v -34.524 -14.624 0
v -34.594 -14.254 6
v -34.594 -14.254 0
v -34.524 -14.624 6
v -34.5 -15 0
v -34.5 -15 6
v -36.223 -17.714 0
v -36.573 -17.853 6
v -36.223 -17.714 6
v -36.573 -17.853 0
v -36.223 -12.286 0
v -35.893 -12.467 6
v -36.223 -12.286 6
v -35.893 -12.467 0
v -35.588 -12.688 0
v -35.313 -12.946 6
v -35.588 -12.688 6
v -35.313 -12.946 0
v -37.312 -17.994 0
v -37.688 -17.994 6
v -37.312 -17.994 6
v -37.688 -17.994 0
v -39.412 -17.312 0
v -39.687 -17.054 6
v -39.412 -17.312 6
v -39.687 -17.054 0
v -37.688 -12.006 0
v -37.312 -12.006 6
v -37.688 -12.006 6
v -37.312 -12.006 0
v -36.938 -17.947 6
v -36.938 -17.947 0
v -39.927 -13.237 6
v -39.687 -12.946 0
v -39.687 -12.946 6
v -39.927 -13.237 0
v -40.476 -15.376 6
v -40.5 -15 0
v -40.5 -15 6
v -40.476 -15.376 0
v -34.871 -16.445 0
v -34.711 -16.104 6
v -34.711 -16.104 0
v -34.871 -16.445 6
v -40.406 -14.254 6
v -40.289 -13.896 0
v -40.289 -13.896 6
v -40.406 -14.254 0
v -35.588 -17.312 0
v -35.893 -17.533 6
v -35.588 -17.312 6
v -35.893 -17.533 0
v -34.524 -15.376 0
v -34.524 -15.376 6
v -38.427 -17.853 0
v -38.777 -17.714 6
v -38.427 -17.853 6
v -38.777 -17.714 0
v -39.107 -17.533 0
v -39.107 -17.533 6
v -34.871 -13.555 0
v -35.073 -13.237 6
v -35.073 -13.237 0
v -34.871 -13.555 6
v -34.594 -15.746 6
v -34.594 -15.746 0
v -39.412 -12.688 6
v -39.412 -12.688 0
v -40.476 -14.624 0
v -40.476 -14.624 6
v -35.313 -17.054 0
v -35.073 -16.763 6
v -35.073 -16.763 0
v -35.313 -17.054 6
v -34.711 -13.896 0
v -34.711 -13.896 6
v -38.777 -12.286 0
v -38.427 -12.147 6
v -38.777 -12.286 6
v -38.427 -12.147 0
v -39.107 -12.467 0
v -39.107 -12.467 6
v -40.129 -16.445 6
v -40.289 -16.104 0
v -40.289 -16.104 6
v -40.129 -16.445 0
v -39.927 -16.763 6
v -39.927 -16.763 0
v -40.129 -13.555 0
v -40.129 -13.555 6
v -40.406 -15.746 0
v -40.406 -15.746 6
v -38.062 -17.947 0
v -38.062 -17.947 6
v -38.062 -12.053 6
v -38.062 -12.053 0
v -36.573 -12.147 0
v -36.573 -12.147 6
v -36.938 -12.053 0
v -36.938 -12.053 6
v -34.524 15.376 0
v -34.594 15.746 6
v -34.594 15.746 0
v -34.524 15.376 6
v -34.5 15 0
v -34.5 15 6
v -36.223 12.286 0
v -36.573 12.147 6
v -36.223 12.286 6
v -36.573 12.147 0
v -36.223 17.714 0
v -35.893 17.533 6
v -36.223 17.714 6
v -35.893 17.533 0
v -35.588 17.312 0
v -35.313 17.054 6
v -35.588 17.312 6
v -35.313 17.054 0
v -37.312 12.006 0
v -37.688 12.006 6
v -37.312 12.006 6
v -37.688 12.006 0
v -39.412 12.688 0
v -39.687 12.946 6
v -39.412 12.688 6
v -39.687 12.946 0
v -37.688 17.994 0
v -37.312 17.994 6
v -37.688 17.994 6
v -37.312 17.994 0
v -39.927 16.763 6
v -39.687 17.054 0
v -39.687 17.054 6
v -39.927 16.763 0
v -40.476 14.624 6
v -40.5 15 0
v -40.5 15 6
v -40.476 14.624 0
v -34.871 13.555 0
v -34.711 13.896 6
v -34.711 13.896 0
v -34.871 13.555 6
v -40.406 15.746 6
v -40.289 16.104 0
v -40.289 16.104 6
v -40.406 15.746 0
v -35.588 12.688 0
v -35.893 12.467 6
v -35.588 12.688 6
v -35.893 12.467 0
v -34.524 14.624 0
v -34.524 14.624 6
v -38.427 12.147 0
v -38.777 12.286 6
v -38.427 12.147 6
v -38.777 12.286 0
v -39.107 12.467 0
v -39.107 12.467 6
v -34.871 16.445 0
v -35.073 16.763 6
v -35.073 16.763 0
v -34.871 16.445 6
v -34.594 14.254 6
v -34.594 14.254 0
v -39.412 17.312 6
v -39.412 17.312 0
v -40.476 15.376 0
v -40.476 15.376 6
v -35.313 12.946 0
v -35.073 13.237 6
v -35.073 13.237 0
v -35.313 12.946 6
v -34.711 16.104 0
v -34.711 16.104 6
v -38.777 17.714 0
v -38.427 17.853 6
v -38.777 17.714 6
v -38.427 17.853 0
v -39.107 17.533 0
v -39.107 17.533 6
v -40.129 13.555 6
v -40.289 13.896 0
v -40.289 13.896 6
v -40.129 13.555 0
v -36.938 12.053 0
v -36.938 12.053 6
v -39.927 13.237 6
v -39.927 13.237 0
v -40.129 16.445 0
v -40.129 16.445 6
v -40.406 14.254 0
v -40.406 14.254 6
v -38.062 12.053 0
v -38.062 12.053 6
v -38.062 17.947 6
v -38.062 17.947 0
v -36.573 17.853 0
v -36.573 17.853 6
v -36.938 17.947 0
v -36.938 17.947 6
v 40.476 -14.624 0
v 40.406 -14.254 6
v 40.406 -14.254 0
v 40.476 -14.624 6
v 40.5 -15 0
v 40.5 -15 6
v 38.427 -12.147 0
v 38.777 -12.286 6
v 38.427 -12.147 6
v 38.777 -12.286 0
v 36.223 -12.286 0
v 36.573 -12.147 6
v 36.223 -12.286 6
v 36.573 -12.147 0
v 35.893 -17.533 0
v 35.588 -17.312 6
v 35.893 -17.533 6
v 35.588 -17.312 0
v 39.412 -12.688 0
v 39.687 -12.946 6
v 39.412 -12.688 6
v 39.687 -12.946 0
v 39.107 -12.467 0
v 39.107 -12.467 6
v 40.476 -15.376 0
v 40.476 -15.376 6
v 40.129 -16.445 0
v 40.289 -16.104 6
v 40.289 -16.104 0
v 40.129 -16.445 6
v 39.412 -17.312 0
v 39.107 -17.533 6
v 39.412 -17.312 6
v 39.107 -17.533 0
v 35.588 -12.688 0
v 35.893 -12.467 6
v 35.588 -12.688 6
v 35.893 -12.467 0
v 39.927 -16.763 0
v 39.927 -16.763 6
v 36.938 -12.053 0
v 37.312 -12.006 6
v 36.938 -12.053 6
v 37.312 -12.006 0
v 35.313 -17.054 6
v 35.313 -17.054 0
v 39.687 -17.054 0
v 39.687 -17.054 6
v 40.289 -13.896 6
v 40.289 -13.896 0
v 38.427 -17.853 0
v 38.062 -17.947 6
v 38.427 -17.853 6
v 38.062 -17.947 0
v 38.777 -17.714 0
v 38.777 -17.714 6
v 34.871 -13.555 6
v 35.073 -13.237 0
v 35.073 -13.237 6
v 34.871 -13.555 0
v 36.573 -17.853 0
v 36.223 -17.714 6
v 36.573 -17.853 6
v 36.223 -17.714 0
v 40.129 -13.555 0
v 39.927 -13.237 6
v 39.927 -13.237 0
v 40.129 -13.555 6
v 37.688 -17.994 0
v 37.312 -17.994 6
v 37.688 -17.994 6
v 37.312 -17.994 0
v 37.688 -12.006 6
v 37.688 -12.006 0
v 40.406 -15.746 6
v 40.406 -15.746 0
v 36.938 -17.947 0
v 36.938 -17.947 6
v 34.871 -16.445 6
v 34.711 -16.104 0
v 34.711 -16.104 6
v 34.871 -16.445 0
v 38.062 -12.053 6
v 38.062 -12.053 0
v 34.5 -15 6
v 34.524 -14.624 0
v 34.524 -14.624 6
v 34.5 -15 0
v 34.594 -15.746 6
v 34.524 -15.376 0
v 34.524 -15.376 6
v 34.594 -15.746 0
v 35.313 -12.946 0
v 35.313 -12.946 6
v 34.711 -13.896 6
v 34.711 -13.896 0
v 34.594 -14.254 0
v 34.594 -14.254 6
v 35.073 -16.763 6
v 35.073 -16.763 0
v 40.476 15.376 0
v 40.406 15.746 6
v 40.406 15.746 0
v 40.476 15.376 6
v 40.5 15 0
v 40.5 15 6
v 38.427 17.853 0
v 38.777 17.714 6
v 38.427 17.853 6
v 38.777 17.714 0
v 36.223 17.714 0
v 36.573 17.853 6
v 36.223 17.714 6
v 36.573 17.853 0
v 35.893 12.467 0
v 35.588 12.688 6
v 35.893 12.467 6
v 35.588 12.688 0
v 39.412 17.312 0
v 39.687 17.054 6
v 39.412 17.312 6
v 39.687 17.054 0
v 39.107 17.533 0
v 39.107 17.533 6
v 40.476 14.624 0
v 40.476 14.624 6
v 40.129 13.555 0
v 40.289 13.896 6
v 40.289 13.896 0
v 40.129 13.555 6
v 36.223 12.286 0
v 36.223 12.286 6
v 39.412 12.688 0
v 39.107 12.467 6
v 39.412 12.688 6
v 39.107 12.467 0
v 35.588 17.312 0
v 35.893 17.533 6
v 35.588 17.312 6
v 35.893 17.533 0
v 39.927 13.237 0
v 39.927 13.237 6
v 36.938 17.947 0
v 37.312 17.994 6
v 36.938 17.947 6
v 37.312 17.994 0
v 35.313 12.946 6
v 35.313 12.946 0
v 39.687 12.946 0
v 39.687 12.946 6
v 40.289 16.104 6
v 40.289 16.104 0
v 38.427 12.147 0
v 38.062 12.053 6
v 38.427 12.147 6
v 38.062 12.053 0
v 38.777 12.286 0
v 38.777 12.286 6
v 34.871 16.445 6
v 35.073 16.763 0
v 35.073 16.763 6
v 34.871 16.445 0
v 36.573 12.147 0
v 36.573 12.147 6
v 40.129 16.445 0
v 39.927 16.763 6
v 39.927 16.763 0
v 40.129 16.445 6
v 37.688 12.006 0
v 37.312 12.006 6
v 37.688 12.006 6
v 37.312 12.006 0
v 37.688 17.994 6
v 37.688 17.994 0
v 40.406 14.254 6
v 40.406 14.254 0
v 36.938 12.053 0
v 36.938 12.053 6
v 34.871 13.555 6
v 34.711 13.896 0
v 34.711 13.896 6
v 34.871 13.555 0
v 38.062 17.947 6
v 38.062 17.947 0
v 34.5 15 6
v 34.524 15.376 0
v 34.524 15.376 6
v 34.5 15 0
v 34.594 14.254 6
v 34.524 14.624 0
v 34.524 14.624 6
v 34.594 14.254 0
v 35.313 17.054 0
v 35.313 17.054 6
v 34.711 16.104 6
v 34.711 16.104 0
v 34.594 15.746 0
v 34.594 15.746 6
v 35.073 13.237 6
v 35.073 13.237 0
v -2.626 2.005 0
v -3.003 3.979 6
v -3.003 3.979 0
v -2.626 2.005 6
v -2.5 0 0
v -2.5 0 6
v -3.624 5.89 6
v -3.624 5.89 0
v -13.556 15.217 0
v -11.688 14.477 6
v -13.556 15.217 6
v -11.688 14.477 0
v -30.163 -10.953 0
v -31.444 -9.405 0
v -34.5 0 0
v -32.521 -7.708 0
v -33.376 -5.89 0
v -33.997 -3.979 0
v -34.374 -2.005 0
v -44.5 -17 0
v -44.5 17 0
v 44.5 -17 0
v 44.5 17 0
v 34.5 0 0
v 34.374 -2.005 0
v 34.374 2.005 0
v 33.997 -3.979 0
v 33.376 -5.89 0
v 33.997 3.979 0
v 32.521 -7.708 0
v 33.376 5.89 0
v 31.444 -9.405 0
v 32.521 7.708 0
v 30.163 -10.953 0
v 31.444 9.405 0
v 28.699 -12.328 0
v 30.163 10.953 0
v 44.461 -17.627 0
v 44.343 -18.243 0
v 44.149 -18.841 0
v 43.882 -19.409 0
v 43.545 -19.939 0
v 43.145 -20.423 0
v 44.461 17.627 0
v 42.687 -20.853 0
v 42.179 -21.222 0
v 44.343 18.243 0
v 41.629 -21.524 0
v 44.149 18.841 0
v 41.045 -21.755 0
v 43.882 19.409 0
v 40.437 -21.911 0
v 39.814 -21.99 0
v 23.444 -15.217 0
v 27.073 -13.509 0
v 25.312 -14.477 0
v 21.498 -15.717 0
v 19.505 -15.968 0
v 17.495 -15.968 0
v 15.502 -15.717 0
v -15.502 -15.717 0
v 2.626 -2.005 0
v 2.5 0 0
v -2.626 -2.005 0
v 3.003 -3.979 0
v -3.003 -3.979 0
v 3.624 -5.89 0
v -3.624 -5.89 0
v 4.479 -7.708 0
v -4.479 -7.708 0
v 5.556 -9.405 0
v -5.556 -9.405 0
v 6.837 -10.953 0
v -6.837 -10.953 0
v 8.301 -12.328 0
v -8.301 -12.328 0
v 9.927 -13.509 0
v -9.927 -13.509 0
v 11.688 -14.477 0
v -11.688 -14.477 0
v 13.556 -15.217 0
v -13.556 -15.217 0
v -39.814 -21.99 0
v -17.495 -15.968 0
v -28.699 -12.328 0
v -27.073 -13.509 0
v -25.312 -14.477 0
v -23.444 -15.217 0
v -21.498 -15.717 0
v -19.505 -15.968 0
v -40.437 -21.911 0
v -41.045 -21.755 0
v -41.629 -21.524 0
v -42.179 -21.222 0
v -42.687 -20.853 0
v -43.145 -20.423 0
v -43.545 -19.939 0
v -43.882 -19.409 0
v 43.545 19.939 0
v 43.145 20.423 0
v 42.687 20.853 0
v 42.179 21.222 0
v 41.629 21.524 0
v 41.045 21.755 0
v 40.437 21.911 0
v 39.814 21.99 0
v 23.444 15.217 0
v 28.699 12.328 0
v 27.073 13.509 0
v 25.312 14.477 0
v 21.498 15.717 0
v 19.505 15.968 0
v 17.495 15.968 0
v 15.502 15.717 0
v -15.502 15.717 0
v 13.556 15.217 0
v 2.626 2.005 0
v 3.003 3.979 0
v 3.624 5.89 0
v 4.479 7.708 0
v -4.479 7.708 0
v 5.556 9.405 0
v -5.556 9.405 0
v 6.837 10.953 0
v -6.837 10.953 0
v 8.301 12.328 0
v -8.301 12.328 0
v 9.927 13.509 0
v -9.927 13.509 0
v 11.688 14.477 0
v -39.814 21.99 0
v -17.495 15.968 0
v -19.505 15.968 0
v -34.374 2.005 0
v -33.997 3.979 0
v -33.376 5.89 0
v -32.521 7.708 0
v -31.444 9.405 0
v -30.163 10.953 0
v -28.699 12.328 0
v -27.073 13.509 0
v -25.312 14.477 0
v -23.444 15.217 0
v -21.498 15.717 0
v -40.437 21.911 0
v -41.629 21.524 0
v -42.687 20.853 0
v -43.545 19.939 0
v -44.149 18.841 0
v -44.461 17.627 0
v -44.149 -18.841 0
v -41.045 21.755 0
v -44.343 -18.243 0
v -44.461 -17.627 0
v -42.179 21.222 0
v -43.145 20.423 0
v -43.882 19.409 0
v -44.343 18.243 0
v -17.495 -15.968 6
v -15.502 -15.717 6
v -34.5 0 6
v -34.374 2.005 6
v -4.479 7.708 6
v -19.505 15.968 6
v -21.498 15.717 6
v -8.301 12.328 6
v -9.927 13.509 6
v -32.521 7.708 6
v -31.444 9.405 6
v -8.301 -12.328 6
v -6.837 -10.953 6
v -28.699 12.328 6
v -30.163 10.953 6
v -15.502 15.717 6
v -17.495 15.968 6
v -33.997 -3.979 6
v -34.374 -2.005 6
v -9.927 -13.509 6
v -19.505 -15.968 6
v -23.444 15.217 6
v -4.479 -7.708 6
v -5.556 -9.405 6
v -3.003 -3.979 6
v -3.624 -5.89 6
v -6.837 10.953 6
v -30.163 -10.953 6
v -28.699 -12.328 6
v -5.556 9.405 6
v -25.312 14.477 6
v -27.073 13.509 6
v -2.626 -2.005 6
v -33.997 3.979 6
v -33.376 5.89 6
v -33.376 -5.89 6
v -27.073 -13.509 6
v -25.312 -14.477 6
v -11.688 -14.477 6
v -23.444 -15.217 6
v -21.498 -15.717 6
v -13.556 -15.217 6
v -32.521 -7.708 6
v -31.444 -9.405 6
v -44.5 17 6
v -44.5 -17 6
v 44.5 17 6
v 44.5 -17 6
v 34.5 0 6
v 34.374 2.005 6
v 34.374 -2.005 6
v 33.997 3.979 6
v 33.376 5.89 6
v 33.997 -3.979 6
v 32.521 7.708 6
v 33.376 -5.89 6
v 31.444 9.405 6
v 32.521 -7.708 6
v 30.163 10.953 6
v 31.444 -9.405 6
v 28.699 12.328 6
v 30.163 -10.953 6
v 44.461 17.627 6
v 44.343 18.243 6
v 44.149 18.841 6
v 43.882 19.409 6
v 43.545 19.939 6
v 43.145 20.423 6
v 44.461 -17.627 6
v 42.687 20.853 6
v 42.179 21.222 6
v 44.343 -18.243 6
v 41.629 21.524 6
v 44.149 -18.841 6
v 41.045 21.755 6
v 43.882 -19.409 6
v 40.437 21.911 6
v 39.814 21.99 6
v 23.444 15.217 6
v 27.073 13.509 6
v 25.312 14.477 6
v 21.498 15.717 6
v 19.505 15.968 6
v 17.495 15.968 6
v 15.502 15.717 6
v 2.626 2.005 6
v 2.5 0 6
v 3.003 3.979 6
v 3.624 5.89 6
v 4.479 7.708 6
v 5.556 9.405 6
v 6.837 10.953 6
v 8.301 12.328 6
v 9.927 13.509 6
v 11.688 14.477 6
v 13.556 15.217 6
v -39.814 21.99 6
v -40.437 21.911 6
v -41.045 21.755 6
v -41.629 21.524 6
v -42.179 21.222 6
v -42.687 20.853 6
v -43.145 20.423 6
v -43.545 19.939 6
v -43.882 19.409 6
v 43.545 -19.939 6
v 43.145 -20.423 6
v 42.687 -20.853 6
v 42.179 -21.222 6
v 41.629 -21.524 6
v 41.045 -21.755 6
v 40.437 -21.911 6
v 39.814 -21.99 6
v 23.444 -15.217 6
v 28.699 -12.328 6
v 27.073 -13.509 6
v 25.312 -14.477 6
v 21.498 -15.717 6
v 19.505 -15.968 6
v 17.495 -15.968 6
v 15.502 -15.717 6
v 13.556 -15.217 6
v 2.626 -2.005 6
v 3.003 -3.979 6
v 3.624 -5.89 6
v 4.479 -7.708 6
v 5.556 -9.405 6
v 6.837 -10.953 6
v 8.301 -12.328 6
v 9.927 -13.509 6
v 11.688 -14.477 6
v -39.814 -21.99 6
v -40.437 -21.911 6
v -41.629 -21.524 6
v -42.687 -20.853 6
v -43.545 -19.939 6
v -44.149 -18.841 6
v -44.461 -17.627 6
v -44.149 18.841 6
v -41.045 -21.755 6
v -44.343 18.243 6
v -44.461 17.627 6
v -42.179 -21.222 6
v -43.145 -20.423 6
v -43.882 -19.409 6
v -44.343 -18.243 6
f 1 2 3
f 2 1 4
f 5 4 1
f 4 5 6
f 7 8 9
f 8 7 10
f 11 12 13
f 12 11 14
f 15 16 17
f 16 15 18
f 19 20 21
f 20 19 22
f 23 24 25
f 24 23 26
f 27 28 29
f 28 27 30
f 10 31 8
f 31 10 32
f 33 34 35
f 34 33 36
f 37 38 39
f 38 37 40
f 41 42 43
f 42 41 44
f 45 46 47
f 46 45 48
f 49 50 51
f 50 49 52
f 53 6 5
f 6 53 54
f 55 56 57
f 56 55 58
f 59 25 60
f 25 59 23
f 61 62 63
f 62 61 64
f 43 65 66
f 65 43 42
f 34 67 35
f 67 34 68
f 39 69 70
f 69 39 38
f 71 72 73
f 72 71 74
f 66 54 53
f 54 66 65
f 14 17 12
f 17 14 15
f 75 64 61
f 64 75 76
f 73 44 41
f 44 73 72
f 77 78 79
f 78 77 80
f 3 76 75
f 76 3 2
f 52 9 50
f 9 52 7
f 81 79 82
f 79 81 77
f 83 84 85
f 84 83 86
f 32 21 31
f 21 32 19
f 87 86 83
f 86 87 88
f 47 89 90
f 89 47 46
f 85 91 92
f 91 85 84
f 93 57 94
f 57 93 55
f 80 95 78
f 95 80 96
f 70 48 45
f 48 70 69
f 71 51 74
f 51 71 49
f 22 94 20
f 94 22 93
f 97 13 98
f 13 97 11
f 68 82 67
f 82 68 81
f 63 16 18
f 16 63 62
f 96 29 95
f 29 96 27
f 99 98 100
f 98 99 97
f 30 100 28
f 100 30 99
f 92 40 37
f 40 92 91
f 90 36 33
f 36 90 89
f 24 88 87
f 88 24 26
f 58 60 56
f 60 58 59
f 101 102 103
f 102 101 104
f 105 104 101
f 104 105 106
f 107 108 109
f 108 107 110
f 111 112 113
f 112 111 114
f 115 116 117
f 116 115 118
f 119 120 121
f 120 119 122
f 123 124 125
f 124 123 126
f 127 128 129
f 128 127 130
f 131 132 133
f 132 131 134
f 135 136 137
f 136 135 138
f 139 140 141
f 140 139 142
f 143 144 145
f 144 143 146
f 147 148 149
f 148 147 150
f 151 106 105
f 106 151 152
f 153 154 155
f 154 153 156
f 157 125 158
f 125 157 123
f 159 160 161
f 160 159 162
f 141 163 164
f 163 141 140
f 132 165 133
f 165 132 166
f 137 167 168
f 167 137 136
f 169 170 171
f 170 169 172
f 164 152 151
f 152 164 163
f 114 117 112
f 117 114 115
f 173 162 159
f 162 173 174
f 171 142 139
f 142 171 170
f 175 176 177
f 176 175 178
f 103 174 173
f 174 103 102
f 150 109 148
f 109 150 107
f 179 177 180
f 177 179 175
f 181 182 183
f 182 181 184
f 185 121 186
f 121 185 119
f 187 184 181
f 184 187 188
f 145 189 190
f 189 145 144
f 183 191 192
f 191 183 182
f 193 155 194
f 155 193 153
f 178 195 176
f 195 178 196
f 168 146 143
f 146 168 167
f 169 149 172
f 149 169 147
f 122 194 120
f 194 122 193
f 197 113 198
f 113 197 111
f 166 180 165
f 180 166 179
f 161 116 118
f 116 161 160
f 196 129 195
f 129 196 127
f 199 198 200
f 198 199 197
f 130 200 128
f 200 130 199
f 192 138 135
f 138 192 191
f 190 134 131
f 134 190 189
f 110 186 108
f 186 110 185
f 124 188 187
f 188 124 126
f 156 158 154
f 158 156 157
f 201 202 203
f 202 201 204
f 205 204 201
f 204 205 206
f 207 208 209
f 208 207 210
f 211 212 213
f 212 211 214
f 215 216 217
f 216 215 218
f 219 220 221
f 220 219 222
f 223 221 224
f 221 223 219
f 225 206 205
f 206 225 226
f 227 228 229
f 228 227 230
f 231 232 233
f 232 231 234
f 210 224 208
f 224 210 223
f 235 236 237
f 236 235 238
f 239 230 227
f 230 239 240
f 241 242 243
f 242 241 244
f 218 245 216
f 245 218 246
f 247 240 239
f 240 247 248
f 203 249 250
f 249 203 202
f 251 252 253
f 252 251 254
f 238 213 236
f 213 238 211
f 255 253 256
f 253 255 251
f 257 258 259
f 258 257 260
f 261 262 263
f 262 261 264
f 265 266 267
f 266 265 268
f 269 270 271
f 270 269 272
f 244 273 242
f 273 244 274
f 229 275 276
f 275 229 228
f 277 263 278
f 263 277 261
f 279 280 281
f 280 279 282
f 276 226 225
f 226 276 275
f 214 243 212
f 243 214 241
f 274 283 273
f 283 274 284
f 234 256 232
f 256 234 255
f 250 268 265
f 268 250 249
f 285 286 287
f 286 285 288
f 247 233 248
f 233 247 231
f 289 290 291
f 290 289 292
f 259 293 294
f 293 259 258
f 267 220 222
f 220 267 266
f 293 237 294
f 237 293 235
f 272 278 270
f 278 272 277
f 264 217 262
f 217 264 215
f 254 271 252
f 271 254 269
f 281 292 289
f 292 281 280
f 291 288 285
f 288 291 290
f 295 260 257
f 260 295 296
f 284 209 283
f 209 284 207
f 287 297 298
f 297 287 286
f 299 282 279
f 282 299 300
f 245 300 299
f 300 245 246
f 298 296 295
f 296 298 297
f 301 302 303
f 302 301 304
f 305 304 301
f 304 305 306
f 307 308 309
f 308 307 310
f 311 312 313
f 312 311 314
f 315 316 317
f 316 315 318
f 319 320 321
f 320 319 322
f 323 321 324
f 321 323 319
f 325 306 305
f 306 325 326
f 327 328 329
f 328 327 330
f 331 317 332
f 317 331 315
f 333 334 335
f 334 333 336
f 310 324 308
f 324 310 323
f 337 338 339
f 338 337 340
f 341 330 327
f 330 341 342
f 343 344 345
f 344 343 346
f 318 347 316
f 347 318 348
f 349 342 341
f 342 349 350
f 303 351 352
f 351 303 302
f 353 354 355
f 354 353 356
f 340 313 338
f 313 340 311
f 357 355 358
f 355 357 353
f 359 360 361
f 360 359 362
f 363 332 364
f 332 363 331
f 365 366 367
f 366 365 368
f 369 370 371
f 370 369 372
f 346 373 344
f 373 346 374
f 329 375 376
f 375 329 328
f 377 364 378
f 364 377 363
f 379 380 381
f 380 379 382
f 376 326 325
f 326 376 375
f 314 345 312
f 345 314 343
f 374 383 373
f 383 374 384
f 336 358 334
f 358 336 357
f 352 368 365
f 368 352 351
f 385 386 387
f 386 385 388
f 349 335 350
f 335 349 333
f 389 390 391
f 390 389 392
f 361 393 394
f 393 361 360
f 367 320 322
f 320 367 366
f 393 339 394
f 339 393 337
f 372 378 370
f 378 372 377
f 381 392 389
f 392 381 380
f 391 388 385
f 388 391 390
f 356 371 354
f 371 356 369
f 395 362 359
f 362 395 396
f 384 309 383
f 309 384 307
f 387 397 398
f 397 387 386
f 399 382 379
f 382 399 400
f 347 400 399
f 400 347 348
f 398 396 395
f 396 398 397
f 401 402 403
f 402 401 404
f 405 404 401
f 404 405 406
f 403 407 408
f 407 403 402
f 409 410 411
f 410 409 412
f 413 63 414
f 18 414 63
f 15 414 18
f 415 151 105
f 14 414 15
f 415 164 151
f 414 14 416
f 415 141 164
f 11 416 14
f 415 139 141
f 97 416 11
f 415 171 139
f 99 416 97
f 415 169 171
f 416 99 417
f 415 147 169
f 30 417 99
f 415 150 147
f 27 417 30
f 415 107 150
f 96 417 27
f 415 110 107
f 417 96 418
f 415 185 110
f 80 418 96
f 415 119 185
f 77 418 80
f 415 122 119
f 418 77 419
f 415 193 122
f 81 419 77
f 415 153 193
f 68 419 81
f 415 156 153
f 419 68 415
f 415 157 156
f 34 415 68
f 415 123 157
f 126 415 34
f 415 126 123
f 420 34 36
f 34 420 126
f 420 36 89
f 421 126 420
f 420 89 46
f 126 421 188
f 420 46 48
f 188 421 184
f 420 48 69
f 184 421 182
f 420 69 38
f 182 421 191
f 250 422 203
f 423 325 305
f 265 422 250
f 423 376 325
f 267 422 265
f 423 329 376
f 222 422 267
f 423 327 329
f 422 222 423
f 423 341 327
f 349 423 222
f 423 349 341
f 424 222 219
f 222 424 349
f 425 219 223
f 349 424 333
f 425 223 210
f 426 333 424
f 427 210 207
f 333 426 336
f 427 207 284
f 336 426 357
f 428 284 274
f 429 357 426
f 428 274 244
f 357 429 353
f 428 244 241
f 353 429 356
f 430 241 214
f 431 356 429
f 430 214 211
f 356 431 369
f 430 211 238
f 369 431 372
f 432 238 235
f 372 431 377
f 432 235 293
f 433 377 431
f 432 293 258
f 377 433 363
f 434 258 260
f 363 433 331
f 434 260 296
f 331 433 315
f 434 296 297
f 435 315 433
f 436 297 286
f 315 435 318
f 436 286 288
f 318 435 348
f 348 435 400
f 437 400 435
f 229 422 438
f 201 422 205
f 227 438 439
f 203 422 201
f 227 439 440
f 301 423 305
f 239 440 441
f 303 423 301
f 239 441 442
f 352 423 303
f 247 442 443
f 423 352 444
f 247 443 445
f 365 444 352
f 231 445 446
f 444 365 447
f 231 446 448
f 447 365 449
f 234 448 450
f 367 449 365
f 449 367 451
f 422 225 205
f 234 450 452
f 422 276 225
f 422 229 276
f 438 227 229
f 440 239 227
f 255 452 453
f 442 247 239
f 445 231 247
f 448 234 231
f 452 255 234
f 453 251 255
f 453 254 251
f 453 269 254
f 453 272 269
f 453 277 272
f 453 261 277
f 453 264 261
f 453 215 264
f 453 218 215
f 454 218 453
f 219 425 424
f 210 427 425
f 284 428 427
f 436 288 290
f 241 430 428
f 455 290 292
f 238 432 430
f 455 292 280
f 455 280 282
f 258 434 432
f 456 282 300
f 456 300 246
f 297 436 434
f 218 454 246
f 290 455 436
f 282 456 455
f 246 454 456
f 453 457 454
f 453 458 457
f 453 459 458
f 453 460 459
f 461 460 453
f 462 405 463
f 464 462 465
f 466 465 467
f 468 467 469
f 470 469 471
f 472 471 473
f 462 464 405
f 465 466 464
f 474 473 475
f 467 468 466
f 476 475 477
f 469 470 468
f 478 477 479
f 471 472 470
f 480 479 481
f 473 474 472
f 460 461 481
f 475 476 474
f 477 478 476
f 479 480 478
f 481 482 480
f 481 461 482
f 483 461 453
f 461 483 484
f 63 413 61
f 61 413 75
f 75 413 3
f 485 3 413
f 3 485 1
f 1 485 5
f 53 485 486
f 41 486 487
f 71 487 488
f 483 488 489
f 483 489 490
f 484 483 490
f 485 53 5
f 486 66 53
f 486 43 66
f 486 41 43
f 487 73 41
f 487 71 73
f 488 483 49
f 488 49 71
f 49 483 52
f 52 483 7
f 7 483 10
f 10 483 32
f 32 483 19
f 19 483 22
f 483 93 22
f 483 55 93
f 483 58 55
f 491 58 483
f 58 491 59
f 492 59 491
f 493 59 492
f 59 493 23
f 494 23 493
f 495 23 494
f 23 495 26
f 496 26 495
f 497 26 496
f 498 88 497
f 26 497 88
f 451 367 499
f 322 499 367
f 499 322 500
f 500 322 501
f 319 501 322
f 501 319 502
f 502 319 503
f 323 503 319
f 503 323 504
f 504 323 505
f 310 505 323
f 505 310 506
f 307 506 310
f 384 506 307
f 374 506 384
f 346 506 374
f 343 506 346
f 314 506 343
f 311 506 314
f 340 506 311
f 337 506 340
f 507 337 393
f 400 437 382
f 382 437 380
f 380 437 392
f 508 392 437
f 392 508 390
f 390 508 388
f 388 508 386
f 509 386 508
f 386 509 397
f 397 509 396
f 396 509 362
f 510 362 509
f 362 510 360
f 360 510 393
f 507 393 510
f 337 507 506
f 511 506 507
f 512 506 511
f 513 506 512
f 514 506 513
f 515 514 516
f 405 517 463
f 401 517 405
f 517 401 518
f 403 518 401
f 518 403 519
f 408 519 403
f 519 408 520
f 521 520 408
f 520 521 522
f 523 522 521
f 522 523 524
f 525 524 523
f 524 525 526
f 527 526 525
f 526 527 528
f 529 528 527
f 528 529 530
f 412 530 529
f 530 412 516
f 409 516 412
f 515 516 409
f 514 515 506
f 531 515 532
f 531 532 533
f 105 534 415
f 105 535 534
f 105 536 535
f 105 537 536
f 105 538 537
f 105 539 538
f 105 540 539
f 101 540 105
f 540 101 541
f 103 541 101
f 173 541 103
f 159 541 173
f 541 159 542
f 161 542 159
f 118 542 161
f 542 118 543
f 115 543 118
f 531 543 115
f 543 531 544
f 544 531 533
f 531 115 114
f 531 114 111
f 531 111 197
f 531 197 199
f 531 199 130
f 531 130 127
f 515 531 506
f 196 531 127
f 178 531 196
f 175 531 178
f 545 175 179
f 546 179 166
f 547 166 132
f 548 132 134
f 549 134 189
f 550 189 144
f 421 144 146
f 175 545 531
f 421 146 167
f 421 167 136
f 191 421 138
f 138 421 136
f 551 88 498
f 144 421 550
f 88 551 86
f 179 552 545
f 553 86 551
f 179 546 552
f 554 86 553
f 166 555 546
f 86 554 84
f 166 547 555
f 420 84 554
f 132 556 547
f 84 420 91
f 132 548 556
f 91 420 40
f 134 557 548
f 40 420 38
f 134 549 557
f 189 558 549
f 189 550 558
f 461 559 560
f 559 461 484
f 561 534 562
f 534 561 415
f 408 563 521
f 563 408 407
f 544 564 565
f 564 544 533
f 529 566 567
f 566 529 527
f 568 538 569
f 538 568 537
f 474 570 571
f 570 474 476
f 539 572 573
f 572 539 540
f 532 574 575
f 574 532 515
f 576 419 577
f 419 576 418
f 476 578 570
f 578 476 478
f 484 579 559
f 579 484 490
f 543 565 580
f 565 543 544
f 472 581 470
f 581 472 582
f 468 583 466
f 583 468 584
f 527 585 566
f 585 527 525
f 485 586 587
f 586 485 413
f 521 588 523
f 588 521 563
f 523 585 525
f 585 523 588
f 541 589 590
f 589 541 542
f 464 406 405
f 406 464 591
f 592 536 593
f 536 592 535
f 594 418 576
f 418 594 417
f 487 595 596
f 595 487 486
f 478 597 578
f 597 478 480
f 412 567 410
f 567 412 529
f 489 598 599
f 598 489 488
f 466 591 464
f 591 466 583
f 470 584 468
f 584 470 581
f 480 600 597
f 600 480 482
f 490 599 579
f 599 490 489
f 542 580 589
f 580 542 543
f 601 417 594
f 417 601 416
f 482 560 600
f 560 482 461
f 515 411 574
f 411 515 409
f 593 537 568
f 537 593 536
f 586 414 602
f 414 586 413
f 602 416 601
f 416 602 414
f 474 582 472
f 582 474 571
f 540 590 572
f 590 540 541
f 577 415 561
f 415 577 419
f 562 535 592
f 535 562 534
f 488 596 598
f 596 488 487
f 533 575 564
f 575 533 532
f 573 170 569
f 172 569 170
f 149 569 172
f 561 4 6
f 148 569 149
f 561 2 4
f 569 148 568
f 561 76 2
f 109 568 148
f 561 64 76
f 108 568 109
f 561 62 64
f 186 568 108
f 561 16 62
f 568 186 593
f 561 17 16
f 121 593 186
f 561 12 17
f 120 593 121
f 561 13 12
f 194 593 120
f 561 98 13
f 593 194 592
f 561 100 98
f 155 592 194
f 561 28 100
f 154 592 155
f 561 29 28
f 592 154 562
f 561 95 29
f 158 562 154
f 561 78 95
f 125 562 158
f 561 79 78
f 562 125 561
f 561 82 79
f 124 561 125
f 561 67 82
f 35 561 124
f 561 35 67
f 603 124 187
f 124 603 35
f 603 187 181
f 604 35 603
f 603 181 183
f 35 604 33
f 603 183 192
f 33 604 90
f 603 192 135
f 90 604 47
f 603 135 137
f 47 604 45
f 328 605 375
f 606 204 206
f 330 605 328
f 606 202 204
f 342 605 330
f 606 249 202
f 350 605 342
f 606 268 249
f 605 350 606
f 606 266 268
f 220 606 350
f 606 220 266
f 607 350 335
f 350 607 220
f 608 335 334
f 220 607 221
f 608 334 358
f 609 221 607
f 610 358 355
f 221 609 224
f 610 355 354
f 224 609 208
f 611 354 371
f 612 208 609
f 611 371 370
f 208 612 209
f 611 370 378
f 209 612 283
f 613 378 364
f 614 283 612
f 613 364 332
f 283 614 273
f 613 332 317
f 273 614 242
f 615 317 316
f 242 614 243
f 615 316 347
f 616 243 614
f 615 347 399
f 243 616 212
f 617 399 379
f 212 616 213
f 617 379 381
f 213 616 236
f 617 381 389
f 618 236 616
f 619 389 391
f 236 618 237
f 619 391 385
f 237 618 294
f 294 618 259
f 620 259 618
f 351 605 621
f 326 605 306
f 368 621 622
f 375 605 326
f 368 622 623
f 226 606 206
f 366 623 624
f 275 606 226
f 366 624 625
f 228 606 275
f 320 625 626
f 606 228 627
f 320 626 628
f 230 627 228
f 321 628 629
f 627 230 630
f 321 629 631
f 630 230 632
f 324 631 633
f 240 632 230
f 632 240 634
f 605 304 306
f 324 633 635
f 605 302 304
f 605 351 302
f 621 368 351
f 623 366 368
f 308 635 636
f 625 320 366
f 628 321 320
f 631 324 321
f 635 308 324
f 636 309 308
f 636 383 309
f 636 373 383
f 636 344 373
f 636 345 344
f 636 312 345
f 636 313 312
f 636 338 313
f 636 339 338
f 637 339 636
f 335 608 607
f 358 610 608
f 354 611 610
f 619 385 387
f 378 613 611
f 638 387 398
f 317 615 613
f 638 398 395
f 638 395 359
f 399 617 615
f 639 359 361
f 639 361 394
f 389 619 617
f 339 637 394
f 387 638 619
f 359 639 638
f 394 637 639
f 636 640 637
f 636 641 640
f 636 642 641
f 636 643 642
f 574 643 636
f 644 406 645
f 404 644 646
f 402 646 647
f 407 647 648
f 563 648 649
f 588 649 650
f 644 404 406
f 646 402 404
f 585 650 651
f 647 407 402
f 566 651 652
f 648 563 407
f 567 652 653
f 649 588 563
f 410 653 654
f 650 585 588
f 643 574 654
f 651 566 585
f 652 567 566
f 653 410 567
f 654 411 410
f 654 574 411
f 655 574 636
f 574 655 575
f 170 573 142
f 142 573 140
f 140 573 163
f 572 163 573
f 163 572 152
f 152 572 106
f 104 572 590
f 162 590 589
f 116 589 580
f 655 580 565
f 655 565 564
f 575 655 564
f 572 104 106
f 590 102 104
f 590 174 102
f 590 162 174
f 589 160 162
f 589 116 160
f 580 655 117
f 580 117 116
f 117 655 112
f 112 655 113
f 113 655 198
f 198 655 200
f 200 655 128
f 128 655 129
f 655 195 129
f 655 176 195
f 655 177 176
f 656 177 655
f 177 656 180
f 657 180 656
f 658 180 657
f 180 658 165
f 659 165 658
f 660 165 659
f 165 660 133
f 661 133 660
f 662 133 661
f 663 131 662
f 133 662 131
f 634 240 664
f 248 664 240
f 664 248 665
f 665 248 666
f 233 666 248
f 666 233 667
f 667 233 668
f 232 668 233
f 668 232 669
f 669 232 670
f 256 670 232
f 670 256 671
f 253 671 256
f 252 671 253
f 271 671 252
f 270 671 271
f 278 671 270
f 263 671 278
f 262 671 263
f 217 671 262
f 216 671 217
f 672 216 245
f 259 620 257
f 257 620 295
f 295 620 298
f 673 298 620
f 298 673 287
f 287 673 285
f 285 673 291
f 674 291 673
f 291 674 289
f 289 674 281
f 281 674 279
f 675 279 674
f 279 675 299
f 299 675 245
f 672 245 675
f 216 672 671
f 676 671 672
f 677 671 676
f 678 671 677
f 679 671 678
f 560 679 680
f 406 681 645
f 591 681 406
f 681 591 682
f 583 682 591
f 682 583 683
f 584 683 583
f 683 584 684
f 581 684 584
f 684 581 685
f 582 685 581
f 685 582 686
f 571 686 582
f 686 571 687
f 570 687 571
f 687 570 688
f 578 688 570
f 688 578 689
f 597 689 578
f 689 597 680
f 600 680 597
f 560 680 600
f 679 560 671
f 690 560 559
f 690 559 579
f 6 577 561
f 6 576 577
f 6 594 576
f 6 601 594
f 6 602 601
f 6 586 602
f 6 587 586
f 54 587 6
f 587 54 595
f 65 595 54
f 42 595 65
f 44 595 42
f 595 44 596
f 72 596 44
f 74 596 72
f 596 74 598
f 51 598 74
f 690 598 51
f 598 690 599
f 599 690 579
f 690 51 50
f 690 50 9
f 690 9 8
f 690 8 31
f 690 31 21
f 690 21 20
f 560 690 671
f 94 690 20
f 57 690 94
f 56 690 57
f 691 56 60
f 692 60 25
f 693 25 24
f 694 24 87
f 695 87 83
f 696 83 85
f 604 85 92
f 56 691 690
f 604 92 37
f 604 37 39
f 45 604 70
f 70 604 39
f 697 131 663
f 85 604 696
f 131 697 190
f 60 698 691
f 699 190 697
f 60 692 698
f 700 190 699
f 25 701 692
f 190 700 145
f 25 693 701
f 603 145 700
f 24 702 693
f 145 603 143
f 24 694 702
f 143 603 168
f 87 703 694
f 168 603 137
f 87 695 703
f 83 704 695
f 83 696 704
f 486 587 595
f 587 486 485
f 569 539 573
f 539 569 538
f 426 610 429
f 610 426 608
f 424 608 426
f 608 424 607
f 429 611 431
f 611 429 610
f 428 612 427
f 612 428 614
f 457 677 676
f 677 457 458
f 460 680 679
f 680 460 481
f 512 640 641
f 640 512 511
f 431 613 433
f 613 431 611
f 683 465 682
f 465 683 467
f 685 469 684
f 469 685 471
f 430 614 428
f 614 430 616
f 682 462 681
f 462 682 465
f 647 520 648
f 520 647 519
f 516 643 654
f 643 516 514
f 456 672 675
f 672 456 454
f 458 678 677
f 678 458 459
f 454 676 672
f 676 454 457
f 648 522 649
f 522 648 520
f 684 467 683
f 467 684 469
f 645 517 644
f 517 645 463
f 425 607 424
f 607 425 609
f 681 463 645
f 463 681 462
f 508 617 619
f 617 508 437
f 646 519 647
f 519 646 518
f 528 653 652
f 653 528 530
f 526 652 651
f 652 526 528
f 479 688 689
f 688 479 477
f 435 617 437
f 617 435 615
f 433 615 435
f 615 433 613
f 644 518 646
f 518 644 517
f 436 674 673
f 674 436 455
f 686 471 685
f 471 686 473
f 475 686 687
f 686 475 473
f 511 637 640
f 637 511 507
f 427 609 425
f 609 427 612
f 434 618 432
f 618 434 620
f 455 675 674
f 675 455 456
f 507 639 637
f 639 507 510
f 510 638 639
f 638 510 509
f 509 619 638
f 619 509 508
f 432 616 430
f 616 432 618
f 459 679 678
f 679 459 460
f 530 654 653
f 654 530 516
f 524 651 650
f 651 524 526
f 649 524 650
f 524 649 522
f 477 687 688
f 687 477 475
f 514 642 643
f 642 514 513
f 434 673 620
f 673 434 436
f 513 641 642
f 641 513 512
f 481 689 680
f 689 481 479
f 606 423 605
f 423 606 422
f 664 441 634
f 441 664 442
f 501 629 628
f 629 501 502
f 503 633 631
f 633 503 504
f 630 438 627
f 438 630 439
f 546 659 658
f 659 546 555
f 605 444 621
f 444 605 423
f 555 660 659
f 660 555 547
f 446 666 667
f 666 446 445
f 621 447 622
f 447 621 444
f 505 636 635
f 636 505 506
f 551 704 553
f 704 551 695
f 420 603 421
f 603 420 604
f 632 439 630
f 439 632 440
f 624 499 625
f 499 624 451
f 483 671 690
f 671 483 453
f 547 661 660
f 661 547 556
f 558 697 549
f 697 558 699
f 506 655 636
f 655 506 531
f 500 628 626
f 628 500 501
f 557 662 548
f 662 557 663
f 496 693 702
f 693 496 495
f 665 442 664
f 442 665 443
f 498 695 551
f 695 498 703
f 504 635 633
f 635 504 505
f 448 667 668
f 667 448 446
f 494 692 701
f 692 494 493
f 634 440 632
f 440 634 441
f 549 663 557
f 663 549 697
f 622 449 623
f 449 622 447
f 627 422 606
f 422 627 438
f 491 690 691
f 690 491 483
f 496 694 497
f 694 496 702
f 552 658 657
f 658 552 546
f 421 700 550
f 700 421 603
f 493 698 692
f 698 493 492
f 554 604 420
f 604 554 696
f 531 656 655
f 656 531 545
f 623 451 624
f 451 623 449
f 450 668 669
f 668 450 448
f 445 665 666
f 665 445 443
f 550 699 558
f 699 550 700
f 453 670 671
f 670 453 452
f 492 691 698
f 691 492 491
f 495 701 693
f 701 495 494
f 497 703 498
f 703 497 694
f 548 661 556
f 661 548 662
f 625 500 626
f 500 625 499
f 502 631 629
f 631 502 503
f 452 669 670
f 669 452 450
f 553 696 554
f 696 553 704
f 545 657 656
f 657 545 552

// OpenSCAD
$fn = 50;


difference() {
	union() {
		hull() {
			translate(v = [-39.5000000000, 17.0000000000, 0]) {
				cylinder(h = 6, r = 5);
			}
			translate(v = [39.5000000000, 17.0000000000, 0]) {
				cylinder(h = 6, r = 5);
			}
			translate(v = [-39.5000000000, -17.0000000000, 0]) {
				cylinder(h = 6, r = 5);
			}
			translate(v = [39.5000000000, -17.0000000000, 0]) {
				cylinder(h = 6, r = 5);
			}
		}
	}
	union() {
		#translate(v = [-37.5000000000, -15.0000000000, -100.0000000000]) {
			cylinder(h = 200, r = 3.0000000000);
		}
		#translate(v = [-37.5000000000, 15.0000000000, -100.0000000000]) {
			cylinder(h = 200, r = 3.0000000000);
		}
		#translate(v = [37.5000000000, -15.0000000000, -100.0000000000]) {
			cylinder(h = 200, r = 3.0000000000);
		}
		#translate(v = [37.5000000000, 15.0000000000, -100.0000000000]) {
			cylinder(h = 200, r = 3.0000000000);
		}
		#translate(v = [-18.5000000000, 0, 0]) {
			cylinder(h = 6, r = 16.0000000000);
		}
		#translate(v = [18.5000000000, 0, 0]) {
			cylinder(h = 6, r = 16.0000000000);
		}
	}
}
